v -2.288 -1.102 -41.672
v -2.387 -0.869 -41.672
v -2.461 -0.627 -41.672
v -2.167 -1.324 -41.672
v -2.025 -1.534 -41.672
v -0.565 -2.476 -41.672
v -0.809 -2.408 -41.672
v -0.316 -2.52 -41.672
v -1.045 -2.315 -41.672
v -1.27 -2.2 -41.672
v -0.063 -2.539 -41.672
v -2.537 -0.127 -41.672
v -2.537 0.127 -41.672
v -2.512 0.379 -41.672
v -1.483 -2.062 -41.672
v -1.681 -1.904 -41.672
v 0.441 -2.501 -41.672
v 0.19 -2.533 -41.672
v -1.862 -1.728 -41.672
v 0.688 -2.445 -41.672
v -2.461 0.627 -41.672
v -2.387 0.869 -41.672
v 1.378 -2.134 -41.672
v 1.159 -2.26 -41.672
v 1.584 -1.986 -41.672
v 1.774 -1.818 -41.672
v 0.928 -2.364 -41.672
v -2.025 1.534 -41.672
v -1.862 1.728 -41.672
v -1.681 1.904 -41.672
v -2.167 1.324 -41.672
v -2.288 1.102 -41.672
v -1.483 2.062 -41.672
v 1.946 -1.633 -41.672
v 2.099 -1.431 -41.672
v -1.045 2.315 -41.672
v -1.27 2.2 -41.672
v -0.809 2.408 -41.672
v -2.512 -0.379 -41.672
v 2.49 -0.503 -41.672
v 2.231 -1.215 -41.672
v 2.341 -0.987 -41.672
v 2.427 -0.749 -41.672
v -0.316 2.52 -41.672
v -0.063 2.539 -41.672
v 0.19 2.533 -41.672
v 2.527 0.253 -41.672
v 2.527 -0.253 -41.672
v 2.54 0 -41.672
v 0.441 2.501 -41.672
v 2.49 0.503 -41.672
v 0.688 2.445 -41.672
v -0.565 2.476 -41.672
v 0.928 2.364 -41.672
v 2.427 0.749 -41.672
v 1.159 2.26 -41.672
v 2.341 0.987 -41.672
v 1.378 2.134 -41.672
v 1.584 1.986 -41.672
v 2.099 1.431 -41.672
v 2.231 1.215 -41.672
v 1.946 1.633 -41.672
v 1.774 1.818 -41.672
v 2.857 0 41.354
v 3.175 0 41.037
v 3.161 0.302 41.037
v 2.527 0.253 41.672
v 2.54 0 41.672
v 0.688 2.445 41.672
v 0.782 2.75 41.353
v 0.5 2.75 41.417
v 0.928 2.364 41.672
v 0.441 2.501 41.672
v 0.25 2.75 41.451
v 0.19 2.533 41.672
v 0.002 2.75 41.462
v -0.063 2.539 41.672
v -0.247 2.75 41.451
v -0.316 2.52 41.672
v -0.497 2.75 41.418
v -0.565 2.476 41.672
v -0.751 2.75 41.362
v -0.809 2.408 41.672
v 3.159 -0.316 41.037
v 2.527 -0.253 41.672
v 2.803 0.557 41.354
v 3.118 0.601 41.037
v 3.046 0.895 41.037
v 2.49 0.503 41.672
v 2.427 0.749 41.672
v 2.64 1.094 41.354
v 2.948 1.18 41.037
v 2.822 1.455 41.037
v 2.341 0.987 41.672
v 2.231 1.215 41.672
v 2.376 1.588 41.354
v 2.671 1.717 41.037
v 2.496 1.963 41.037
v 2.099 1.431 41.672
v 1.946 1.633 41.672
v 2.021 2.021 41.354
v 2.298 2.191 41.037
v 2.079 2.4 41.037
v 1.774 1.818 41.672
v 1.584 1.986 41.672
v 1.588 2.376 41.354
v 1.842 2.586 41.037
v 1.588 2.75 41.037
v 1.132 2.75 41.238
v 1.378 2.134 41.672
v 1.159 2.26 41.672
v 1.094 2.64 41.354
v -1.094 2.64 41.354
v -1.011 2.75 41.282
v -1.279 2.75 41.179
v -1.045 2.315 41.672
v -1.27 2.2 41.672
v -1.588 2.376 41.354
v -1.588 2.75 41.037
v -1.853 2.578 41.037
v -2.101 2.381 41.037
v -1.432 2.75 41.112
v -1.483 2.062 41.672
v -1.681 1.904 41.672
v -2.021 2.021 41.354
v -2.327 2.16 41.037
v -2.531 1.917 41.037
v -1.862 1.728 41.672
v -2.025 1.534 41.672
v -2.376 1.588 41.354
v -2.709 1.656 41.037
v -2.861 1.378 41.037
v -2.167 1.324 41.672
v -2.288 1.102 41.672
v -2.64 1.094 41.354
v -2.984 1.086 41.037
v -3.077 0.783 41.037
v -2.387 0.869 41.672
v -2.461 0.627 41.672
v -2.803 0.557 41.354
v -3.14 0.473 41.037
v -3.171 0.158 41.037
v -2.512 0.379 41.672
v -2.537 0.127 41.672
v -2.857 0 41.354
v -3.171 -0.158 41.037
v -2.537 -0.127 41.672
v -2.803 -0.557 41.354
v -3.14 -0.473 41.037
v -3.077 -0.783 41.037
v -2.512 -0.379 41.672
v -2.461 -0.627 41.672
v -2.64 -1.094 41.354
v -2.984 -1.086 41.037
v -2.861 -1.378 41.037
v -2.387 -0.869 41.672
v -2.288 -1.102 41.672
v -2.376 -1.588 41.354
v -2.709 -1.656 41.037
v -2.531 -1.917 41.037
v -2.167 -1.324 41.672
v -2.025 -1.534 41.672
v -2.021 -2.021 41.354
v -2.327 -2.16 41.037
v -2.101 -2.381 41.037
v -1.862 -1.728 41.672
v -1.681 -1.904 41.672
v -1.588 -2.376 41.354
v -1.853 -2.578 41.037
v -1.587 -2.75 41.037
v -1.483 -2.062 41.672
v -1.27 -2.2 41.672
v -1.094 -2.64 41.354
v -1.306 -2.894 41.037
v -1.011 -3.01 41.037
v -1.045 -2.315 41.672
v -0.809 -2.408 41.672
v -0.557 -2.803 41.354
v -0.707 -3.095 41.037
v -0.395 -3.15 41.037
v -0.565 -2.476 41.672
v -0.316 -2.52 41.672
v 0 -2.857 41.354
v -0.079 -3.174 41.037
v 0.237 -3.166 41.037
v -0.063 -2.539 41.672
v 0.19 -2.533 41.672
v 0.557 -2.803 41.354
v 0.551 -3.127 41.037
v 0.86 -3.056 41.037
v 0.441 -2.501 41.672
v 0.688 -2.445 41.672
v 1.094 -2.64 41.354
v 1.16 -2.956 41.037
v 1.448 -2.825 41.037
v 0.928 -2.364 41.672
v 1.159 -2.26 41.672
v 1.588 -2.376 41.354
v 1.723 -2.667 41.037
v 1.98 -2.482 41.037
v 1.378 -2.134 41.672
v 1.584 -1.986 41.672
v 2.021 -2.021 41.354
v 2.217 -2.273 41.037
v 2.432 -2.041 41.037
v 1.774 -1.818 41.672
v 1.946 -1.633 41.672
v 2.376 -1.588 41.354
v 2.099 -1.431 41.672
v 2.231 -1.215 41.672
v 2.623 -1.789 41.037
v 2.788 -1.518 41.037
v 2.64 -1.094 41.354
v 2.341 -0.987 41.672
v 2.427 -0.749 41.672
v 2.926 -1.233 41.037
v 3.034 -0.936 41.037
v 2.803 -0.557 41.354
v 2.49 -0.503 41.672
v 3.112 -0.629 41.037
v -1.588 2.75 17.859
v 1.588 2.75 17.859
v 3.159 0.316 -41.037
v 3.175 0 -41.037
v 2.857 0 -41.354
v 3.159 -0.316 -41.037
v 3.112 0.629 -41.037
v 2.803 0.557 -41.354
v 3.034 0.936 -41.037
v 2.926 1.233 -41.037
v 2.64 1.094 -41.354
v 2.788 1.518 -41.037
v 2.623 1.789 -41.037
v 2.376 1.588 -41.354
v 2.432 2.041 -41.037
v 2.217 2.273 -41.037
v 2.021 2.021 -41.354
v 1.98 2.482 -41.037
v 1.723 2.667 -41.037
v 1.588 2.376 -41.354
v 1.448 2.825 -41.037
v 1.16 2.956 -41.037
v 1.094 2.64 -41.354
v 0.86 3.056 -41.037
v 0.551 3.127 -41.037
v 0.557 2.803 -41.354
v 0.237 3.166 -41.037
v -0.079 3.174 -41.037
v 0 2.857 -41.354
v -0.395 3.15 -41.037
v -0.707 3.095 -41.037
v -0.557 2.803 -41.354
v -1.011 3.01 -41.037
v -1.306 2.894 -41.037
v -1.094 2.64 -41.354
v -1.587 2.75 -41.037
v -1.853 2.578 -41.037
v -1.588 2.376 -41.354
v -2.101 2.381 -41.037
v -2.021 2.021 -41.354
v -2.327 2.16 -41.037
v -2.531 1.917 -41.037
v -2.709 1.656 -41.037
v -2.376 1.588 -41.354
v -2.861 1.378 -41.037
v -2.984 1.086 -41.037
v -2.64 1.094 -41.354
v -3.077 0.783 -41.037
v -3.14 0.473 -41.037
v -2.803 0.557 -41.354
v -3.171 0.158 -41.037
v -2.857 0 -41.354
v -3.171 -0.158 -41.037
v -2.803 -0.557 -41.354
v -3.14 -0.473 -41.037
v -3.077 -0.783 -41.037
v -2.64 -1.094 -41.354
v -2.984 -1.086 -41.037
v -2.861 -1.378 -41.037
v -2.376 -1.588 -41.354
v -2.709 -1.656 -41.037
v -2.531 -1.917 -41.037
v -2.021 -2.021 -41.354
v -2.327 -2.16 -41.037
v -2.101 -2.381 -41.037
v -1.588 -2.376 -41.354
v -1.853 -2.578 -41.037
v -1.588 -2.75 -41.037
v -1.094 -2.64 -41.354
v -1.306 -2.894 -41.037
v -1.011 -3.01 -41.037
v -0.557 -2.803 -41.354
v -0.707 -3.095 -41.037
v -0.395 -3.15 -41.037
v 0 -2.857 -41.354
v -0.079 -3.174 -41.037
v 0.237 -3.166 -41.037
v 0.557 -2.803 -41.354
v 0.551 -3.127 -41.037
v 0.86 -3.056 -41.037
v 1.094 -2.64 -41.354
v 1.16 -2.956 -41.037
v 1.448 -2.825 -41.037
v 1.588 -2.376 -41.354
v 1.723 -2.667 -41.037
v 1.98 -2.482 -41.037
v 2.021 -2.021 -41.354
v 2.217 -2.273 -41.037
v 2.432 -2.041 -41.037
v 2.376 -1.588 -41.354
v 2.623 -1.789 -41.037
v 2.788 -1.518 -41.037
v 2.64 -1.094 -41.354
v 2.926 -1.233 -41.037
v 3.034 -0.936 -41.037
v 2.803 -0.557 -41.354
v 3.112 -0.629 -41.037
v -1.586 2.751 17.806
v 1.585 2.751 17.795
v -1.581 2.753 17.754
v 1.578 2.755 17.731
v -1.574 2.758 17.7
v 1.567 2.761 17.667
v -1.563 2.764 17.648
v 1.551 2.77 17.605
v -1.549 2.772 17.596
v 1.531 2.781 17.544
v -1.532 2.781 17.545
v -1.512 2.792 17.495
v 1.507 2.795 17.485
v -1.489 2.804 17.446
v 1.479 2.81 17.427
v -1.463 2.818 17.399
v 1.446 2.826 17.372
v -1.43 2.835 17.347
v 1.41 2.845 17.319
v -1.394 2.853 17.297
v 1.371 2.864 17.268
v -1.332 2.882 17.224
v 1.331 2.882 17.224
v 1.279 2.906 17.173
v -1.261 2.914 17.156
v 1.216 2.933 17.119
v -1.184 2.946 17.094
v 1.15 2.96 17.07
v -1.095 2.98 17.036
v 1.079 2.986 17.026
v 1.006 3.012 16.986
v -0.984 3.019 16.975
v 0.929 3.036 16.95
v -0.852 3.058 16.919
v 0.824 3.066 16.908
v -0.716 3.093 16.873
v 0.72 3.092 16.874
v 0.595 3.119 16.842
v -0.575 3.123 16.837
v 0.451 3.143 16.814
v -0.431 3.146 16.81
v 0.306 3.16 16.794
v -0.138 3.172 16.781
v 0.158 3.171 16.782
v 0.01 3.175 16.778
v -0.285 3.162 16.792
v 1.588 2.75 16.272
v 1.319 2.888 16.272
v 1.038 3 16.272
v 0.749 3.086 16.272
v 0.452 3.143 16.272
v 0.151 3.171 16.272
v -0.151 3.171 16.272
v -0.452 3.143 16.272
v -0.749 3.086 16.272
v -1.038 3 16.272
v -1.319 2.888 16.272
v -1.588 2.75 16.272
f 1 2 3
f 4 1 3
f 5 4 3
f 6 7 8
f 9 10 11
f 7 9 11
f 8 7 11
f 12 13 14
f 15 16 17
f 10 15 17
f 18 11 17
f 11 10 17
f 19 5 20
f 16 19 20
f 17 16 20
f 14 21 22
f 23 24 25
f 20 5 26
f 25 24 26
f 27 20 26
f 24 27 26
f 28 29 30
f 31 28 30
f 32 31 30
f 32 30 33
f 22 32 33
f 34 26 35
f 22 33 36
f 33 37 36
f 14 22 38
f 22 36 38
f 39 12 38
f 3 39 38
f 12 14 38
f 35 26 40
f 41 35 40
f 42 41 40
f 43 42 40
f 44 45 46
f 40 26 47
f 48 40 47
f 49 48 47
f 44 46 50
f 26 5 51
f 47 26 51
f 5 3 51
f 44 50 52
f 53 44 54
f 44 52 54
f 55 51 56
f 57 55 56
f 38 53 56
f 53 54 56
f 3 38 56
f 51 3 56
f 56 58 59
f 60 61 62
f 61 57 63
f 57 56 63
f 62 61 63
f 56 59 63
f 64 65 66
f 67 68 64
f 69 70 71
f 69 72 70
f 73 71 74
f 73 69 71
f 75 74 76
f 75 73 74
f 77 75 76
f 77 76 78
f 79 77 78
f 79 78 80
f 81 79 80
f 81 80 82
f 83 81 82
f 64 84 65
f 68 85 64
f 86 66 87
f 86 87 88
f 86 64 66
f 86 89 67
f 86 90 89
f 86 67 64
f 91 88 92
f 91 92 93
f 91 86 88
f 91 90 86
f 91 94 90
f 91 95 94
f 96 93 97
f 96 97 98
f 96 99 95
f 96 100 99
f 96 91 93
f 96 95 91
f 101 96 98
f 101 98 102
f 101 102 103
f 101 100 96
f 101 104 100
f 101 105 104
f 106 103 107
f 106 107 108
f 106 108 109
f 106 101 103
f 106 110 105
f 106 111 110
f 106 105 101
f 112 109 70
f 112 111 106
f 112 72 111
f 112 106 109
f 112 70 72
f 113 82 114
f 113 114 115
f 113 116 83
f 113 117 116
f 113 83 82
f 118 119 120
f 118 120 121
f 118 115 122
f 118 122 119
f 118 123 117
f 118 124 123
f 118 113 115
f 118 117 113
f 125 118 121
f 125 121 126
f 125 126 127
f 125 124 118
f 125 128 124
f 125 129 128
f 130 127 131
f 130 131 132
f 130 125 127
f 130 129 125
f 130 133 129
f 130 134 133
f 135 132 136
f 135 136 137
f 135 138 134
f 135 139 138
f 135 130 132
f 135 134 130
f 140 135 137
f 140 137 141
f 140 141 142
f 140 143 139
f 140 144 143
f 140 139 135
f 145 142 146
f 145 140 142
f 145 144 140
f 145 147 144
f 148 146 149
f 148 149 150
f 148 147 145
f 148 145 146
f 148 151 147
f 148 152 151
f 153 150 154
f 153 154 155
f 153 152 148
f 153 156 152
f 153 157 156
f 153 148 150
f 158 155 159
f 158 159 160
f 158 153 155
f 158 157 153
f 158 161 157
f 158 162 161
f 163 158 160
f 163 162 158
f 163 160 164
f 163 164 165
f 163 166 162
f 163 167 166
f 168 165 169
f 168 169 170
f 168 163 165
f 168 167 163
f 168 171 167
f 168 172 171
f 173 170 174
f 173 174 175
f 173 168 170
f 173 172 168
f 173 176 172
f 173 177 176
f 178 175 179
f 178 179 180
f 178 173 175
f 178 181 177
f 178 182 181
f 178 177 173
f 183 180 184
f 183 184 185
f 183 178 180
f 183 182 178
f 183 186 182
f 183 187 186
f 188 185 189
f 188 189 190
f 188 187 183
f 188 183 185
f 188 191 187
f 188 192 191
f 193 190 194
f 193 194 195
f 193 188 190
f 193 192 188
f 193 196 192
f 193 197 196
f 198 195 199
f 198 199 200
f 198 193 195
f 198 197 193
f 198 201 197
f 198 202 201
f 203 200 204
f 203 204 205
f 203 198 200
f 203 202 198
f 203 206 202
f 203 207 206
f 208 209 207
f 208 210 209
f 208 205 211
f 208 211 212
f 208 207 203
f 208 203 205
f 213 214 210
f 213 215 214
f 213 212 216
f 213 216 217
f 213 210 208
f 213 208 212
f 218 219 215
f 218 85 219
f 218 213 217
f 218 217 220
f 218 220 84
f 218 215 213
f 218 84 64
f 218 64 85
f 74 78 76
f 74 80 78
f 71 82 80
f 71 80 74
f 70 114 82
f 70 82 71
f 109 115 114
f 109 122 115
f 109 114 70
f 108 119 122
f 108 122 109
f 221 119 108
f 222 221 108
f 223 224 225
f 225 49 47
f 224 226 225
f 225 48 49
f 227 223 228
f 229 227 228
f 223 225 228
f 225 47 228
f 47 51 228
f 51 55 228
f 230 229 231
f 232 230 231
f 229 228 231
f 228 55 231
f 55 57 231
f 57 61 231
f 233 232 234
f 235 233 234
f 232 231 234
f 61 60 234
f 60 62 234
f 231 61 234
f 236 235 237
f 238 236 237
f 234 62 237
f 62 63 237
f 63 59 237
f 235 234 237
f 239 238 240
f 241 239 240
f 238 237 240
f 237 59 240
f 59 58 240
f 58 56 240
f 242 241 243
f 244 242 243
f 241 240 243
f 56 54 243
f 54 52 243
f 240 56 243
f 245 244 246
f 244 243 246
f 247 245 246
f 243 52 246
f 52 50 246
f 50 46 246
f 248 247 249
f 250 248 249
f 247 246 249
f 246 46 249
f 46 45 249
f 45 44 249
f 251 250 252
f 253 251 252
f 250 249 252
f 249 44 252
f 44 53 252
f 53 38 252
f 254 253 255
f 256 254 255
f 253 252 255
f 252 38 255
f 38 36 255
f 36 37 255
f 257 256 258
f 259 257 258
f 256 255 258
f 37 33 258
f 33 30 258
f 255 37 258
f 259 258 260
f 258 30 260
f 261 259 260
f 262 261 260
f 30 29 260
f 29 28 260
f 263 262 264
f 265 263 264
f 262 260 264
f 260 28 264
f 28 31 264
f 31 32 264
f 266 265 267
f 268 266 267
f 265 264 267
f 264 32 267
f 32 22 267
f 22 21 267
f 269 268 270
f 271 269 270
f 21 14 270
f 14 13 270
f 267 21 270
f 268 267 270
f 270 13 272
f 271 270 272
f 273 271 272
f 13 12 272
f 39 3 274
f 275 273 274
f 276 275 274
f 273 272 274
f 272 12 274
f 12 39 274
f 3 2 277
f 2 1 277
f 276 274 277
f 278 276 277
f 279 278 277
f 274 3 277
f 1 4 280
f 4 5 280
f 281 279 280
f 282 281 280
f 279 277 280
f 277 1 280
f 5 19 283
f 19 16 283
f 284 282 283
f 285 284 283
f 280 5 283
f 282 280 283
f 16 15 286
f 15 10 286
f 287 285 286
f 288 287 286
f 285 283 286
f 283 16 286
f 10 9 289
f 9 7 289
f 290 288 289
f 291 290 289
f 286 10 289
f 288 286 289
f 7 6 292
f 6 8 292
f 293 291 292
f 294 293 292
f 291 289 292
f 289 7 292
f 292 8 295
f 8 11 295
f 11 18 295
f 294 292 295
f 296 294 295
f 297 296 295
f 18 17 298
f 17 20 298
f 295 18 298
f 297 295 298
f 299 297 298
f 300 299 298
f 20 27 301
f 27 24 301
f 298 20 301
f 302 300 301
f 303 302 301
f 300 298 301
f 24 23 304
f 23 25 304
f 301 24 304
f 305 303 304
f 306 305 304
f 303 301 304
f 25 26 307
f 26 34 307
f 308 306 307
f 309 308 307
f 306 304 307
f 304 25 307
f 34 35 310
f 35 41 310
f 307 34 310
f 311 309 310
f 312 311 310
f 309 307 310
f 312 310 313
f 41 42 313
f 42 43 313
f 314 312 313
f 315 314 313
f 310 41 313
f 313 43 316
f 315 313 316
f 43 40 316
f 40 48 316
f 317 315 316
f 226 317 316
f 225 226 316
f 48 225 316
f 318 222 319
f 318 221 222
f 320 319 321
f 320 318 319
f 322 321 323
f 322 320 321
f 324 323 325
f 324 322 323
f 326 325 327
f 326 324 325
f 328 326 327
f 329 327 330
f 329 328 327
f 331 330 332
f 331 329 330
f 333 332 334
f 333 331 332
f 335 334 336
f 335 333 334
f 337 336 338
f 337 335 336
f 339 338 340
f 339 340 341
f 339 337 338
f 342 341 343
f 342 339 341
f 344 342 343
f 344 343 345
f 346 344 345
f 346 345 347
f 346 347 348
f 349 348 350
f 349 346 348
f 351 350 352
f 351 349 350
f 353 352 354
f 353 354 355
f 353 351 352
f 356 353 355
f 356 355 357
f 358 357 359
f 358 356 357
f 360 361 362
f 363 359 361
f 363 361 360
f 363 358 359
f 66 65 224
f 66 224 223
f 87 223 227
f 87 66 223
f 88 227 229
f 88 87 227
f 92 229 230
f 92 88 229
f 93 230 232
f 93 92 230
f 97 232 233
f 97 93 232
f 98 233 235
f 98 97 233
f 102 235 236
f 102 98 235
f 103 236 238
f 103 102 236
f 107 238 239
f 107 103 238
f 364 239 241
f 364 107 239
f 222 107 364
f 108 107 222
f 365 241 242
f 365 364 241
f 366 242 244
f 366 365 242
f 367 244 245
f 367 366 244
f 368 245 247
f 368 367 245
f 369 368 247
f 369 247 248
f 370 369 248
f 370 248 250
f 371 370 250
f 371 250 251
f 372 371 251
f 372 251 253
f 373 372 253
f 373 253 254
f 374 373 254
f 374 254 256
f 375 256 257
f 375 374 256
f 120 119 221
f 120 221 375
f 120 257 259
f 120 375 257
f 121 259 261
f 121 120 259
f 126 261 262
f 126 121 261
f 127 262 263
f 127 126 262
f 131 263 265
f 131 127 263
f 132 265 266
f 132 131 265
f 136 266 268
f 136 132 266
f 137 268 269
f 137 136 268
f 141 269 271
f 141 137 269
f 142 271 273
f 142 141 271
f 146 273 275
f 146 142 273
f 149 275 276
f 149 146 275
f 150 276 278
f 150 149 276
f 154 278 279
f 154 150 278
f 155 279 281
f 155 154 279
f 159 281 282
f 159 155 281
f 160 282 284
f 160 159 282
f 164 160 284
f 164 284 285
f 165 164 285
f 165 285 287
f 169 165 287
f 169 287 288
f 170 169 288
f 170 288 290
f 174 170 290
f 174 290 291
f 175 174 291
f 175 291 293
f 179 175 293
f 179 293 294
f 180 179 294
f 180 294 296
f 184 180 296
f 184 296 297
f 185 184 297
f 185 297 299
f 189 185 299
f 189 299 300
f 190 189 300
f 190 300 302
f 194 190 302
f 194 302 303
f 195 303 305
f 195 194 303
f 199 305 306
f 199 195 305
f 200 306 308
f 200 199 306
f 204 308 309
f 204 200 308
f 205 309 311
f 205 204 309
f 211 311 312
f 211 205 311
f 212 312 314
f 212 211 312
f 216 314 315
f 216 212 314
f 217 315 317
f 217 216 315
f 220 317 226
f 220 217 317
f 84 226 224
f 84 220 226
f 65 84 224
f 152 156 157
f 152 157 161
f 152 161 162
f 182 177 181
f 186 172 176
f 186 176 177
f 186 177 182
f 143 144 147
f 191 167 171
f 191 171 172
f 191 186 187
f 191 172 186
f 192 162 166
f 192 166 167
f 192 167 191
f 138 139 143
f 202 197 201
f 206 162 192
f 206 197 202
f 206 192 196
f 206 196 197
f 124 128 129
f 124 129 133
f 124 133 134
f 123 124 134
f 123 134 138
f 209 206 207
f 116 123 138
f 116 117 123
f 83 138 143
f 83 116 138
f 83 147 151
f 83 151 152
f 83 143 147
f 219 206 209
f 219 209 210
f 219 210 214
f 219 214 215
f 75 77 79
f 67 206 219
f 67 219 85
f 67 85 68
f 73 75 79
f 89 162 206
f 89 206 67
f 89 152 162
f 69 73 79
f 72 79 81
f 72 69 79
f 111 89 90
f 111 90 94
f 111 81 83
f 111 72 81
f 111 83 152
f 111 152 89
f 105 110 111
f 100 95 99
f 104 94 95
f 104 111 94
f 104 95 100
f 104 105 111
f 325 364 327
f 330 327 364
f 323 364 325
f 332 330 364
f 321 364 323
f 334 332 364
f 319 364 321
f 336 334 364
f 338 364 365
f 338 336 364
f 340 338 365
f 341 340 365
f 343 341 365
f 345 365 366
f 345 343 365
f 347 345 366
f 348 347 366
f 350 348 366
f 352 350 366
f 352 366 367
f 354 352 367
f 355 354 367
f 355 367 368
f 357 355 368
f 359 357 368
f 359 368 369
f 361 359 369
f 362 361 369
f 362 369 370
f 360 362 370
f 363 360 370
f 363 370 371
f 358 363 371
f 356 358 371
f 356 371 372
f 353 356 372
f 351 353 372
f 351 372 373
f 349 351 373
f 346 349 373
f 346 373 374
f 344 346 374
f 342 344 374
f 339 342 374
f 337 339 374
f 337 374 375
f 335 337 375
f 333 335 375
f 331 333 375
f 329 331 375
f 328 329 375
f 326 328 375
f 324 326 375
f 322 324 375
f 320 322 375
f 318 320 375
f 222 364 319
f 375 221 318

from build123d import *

# Parameters (mm, degrees)
SKETCH1_R      = 3.175
EXTRUDE1_DEPTH = 41.671875
CHAMFER1_SIZE  = 0.635
EXTRUDE7_DEPTH = 59.117462213
FILLET1_R      = 1.5875


with BuildPart() as part:
    # Sketch1 → Extrude1 (new, symmetric)
    with BuildSketch(Plane.XY):
        Circle(SKETCH1_R)
    extrude(amount=EXTRUDE1_DEPTH, both=True)

    # Chamfer1
    chamfer1_edges = [part.edges().sort_by_distance(p)[0] for p in [
        (-3.175, 0, -41.671875),
        (-3.175, 0, 41.671875),
    ]]
    chamfer(chamfer1_edges, length=CHAMFER1_SIZE)

    # Sketch13 → Extrude7 (cut, through all)
    with BuildSketch(Plane.XY.offset(16.271875)):
        with BuildLine():
            Line((-1.5875, 2.749630657), (1.5875, 2.749630657))
            ThreePointArc((1.5875, 2.749630657), (0, 3.175), (-1.5875, 2.749630657))
        make_face()
    extrude(amount=EXTRUDE7_DEPTH, mode=Mode.SUBTRACT)

    # Fillet1
    # the kernel refuses this fillet: 1.5875 mm, written as the material it adds along each edge
    with BuildSketch(Plane(origin=(-5.55625, 2.749630657, 16.271875), x_dir=(0, 0, 1), z_dir=(1, 0, 0))) as fillet1_piece_1_section:
        with BuildLine():
            CenterArc((FILLET1_R, -FILLET1_R), FILLET1_R, 90, 90)
            Line((0, -FILLET1_R), (0, 0))
            Line((0, 0), (FILLET1_R, 0))
        make_face()
    fillet1_piece_1 = extrude(amount=11.1125, mode=Mode.PRIVATE)
    fillet1_piece_1 = fillet1_piece_1 & Plane(origin=(0, 0, 16.798205884), x_dir=(1, 0, 0), z_dir=(0, 0, 1)) * Cylinder(3.175, 29, mode=Mode.PRIVATE)
    add(fillet1_piece_1)


solid = part.part
